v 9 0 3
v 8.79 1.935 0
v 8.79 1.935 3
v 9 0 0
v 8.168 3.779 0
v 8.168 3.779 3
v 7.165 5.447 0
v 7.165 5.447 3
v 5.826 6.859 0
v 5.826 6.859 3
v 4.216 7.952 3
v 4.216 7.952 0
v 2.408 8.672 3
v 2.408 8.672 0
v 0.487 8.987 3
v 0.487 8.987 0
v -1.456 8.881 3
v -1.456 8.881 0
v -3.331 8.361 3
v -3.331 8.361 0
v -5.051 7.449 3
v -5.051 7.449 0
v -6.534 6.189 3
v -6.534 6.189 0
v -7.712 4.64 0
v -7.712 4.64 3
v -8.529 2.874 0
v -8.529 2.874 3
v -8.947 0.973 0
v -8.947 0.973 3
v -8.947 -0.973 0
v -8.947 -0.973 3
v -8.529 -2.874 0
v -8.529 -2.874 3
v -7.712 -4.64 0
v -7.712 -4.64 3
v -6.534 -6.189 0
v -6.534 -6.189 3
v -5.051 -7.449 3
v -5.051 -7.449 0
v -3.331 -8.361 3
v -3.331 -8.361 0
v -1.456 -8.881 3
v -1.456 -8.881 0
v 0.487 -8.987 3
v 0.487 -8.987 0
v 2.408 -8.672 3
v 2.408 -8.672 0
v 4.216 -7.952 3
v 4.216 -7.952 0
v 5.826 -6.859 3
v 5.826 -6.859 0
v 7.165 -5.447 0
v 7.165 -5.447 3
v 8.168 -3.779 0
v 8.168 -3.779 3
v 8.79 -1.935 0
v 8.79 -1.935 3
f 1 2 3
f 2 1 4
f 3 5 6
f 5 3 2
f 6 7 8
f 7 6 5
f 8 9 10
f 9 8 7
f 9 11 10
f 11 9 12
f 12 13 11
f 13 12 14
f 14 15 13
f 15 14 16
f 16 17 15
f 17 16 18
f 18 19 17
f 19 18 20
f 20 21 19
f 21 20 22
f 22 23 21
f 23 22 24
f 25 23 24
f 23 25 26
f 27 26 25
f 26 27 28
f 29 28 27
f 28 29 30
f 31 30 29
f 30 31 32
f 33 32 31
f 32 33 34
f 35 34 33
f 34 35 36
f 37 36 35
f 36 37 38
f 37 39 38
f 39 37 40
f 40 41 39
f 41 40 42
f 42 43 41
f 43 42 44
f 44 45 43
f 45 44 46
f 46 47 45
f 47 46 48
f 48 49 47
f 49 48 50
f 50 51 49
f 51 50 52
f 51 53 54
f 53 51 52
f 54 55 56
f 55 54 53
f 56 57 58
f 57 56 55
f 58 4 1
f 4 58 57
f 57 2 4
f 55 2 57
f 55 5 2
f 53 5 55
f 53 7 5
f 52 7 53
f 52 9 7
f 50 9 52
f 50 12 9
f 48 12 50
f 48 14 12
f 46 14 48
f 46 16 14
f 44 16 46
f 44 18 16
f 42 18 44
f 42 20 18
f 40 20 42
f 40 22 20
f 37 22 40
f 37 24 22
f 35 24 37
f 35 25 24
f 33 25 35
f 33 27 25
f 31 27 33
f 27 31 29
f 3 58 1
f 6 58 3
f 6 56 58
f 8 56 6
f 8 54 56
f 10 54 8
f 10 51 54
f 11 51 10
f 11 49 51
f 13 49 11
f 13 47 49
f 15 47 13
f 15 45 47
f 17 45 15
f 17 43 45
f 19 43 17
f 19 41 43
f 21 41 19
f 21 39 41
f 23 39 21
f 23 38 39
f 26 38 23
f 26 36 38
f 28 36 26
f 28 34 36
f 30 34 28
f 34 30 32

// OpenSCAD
// Generated by SolidPython 1.0.1 on 2020-07-29 00:39:25


cylinder(h = 3, r1 = 9, r2 = 9);
/***********************************************
*********      SolidPython code:      **********
************************************************
 
# import packages: SolidPython
from solid import *
from solid.utils import *
from itertools import chain, combinations


class Resize:

    def __init__(self, scad_file):
        self.scad_file = scad_file
        #self.scad_file = import_scad(scad_file)
        # cone/cylinder param:
        self.r1 = 0
        self.r2 = 0
        self.h = 0
        # rectangular prism param:
        self.w = 0
        self.l = 0
        # ellipse param:
        self.r = 0

    # import OpenScad code (file name corresponds to shape)


    # classify shape + parameters
    def assign(self, param1, param2, param3):
        if self.scad_file == 'cone.scad':
            self.r1 = param1
            self.r2 = param2
            self.h = param3
        elif self.scad_file == 'cylinder.scad':
            self.r1 = param1
            self.r2 = param2
            self.h = param3
        elif self.scad_file == 'rectangularPrism.scad':
            self.h = param1
            self.l = param2
            self.w = param3
        else:
            self.r = param1
            self.h = param2

    # resize parameters
    def iterate(self):
        x = range(3, 20, 2)
        i = 1
        if self.scad_file == 'cone.scad':
            tempList = list(combinations(x, 2))
            for temp in tempList:
                param1 = temp[0]
                param2 = temp[1]
                filepath = 'produced_scad_files/' + 'cone' + str(param1) + '_' + str(param2) + '_' + '.scad'
                scad_render_to_file(cylinder(h=param1, r1=param2, r2=0), filepath)

        elif self.scad_file == 'cylinder.scad':
            tempList = list(combinations(x, 3))
            for temp in tempList:
                param1 = temp[0]
                param2 = temp[1]
                filepath = 'produced_scad_files/' + 'cylinder' + str(param1) + '_' + str(param2) + '_' + '.scad'
                scad_render_to_file(cylinder(h=param1, r1=param2, r2=param2), filepath)

        elif self.scad_file == 'rectangularPrism.scad':
            tempList = list(combinations(x, 3))
            for temp in tempList:
                param1 = temp[0]
                param2 = temp[1]
                param3 = temp[2]
                filepath = 'produced_scad_files/' + 'rectangularPrism' + str(param1) + '_' + str(param2) + '_' + str(
                    param3) + '.scad'
                scad_render_to_file(cube(size=(param1, param2, param3)), filepath)

        elif self.scad_file == 'ellipse.scad':
            tempList = list(combinations(x, 4))
            for temp in tempList:
                param1 = temp[0]
                param2 = temp[1]
                param3 = temp[2]
                param4 = temp[3]
                filepath = 'produced_scad_files/' + 'ellipse' + str(param1) + '_' + str(param2) + '_' + str(param3) + '_' + str(param4) + '.scad'
                scad_render_to_file(scale([param1, param2, param3])(sphere(r=param4)), filepath)

    def render_to_scadfile(self):
        scad_render_to_file(scad, 'example.scad') 
 
************************************************/
